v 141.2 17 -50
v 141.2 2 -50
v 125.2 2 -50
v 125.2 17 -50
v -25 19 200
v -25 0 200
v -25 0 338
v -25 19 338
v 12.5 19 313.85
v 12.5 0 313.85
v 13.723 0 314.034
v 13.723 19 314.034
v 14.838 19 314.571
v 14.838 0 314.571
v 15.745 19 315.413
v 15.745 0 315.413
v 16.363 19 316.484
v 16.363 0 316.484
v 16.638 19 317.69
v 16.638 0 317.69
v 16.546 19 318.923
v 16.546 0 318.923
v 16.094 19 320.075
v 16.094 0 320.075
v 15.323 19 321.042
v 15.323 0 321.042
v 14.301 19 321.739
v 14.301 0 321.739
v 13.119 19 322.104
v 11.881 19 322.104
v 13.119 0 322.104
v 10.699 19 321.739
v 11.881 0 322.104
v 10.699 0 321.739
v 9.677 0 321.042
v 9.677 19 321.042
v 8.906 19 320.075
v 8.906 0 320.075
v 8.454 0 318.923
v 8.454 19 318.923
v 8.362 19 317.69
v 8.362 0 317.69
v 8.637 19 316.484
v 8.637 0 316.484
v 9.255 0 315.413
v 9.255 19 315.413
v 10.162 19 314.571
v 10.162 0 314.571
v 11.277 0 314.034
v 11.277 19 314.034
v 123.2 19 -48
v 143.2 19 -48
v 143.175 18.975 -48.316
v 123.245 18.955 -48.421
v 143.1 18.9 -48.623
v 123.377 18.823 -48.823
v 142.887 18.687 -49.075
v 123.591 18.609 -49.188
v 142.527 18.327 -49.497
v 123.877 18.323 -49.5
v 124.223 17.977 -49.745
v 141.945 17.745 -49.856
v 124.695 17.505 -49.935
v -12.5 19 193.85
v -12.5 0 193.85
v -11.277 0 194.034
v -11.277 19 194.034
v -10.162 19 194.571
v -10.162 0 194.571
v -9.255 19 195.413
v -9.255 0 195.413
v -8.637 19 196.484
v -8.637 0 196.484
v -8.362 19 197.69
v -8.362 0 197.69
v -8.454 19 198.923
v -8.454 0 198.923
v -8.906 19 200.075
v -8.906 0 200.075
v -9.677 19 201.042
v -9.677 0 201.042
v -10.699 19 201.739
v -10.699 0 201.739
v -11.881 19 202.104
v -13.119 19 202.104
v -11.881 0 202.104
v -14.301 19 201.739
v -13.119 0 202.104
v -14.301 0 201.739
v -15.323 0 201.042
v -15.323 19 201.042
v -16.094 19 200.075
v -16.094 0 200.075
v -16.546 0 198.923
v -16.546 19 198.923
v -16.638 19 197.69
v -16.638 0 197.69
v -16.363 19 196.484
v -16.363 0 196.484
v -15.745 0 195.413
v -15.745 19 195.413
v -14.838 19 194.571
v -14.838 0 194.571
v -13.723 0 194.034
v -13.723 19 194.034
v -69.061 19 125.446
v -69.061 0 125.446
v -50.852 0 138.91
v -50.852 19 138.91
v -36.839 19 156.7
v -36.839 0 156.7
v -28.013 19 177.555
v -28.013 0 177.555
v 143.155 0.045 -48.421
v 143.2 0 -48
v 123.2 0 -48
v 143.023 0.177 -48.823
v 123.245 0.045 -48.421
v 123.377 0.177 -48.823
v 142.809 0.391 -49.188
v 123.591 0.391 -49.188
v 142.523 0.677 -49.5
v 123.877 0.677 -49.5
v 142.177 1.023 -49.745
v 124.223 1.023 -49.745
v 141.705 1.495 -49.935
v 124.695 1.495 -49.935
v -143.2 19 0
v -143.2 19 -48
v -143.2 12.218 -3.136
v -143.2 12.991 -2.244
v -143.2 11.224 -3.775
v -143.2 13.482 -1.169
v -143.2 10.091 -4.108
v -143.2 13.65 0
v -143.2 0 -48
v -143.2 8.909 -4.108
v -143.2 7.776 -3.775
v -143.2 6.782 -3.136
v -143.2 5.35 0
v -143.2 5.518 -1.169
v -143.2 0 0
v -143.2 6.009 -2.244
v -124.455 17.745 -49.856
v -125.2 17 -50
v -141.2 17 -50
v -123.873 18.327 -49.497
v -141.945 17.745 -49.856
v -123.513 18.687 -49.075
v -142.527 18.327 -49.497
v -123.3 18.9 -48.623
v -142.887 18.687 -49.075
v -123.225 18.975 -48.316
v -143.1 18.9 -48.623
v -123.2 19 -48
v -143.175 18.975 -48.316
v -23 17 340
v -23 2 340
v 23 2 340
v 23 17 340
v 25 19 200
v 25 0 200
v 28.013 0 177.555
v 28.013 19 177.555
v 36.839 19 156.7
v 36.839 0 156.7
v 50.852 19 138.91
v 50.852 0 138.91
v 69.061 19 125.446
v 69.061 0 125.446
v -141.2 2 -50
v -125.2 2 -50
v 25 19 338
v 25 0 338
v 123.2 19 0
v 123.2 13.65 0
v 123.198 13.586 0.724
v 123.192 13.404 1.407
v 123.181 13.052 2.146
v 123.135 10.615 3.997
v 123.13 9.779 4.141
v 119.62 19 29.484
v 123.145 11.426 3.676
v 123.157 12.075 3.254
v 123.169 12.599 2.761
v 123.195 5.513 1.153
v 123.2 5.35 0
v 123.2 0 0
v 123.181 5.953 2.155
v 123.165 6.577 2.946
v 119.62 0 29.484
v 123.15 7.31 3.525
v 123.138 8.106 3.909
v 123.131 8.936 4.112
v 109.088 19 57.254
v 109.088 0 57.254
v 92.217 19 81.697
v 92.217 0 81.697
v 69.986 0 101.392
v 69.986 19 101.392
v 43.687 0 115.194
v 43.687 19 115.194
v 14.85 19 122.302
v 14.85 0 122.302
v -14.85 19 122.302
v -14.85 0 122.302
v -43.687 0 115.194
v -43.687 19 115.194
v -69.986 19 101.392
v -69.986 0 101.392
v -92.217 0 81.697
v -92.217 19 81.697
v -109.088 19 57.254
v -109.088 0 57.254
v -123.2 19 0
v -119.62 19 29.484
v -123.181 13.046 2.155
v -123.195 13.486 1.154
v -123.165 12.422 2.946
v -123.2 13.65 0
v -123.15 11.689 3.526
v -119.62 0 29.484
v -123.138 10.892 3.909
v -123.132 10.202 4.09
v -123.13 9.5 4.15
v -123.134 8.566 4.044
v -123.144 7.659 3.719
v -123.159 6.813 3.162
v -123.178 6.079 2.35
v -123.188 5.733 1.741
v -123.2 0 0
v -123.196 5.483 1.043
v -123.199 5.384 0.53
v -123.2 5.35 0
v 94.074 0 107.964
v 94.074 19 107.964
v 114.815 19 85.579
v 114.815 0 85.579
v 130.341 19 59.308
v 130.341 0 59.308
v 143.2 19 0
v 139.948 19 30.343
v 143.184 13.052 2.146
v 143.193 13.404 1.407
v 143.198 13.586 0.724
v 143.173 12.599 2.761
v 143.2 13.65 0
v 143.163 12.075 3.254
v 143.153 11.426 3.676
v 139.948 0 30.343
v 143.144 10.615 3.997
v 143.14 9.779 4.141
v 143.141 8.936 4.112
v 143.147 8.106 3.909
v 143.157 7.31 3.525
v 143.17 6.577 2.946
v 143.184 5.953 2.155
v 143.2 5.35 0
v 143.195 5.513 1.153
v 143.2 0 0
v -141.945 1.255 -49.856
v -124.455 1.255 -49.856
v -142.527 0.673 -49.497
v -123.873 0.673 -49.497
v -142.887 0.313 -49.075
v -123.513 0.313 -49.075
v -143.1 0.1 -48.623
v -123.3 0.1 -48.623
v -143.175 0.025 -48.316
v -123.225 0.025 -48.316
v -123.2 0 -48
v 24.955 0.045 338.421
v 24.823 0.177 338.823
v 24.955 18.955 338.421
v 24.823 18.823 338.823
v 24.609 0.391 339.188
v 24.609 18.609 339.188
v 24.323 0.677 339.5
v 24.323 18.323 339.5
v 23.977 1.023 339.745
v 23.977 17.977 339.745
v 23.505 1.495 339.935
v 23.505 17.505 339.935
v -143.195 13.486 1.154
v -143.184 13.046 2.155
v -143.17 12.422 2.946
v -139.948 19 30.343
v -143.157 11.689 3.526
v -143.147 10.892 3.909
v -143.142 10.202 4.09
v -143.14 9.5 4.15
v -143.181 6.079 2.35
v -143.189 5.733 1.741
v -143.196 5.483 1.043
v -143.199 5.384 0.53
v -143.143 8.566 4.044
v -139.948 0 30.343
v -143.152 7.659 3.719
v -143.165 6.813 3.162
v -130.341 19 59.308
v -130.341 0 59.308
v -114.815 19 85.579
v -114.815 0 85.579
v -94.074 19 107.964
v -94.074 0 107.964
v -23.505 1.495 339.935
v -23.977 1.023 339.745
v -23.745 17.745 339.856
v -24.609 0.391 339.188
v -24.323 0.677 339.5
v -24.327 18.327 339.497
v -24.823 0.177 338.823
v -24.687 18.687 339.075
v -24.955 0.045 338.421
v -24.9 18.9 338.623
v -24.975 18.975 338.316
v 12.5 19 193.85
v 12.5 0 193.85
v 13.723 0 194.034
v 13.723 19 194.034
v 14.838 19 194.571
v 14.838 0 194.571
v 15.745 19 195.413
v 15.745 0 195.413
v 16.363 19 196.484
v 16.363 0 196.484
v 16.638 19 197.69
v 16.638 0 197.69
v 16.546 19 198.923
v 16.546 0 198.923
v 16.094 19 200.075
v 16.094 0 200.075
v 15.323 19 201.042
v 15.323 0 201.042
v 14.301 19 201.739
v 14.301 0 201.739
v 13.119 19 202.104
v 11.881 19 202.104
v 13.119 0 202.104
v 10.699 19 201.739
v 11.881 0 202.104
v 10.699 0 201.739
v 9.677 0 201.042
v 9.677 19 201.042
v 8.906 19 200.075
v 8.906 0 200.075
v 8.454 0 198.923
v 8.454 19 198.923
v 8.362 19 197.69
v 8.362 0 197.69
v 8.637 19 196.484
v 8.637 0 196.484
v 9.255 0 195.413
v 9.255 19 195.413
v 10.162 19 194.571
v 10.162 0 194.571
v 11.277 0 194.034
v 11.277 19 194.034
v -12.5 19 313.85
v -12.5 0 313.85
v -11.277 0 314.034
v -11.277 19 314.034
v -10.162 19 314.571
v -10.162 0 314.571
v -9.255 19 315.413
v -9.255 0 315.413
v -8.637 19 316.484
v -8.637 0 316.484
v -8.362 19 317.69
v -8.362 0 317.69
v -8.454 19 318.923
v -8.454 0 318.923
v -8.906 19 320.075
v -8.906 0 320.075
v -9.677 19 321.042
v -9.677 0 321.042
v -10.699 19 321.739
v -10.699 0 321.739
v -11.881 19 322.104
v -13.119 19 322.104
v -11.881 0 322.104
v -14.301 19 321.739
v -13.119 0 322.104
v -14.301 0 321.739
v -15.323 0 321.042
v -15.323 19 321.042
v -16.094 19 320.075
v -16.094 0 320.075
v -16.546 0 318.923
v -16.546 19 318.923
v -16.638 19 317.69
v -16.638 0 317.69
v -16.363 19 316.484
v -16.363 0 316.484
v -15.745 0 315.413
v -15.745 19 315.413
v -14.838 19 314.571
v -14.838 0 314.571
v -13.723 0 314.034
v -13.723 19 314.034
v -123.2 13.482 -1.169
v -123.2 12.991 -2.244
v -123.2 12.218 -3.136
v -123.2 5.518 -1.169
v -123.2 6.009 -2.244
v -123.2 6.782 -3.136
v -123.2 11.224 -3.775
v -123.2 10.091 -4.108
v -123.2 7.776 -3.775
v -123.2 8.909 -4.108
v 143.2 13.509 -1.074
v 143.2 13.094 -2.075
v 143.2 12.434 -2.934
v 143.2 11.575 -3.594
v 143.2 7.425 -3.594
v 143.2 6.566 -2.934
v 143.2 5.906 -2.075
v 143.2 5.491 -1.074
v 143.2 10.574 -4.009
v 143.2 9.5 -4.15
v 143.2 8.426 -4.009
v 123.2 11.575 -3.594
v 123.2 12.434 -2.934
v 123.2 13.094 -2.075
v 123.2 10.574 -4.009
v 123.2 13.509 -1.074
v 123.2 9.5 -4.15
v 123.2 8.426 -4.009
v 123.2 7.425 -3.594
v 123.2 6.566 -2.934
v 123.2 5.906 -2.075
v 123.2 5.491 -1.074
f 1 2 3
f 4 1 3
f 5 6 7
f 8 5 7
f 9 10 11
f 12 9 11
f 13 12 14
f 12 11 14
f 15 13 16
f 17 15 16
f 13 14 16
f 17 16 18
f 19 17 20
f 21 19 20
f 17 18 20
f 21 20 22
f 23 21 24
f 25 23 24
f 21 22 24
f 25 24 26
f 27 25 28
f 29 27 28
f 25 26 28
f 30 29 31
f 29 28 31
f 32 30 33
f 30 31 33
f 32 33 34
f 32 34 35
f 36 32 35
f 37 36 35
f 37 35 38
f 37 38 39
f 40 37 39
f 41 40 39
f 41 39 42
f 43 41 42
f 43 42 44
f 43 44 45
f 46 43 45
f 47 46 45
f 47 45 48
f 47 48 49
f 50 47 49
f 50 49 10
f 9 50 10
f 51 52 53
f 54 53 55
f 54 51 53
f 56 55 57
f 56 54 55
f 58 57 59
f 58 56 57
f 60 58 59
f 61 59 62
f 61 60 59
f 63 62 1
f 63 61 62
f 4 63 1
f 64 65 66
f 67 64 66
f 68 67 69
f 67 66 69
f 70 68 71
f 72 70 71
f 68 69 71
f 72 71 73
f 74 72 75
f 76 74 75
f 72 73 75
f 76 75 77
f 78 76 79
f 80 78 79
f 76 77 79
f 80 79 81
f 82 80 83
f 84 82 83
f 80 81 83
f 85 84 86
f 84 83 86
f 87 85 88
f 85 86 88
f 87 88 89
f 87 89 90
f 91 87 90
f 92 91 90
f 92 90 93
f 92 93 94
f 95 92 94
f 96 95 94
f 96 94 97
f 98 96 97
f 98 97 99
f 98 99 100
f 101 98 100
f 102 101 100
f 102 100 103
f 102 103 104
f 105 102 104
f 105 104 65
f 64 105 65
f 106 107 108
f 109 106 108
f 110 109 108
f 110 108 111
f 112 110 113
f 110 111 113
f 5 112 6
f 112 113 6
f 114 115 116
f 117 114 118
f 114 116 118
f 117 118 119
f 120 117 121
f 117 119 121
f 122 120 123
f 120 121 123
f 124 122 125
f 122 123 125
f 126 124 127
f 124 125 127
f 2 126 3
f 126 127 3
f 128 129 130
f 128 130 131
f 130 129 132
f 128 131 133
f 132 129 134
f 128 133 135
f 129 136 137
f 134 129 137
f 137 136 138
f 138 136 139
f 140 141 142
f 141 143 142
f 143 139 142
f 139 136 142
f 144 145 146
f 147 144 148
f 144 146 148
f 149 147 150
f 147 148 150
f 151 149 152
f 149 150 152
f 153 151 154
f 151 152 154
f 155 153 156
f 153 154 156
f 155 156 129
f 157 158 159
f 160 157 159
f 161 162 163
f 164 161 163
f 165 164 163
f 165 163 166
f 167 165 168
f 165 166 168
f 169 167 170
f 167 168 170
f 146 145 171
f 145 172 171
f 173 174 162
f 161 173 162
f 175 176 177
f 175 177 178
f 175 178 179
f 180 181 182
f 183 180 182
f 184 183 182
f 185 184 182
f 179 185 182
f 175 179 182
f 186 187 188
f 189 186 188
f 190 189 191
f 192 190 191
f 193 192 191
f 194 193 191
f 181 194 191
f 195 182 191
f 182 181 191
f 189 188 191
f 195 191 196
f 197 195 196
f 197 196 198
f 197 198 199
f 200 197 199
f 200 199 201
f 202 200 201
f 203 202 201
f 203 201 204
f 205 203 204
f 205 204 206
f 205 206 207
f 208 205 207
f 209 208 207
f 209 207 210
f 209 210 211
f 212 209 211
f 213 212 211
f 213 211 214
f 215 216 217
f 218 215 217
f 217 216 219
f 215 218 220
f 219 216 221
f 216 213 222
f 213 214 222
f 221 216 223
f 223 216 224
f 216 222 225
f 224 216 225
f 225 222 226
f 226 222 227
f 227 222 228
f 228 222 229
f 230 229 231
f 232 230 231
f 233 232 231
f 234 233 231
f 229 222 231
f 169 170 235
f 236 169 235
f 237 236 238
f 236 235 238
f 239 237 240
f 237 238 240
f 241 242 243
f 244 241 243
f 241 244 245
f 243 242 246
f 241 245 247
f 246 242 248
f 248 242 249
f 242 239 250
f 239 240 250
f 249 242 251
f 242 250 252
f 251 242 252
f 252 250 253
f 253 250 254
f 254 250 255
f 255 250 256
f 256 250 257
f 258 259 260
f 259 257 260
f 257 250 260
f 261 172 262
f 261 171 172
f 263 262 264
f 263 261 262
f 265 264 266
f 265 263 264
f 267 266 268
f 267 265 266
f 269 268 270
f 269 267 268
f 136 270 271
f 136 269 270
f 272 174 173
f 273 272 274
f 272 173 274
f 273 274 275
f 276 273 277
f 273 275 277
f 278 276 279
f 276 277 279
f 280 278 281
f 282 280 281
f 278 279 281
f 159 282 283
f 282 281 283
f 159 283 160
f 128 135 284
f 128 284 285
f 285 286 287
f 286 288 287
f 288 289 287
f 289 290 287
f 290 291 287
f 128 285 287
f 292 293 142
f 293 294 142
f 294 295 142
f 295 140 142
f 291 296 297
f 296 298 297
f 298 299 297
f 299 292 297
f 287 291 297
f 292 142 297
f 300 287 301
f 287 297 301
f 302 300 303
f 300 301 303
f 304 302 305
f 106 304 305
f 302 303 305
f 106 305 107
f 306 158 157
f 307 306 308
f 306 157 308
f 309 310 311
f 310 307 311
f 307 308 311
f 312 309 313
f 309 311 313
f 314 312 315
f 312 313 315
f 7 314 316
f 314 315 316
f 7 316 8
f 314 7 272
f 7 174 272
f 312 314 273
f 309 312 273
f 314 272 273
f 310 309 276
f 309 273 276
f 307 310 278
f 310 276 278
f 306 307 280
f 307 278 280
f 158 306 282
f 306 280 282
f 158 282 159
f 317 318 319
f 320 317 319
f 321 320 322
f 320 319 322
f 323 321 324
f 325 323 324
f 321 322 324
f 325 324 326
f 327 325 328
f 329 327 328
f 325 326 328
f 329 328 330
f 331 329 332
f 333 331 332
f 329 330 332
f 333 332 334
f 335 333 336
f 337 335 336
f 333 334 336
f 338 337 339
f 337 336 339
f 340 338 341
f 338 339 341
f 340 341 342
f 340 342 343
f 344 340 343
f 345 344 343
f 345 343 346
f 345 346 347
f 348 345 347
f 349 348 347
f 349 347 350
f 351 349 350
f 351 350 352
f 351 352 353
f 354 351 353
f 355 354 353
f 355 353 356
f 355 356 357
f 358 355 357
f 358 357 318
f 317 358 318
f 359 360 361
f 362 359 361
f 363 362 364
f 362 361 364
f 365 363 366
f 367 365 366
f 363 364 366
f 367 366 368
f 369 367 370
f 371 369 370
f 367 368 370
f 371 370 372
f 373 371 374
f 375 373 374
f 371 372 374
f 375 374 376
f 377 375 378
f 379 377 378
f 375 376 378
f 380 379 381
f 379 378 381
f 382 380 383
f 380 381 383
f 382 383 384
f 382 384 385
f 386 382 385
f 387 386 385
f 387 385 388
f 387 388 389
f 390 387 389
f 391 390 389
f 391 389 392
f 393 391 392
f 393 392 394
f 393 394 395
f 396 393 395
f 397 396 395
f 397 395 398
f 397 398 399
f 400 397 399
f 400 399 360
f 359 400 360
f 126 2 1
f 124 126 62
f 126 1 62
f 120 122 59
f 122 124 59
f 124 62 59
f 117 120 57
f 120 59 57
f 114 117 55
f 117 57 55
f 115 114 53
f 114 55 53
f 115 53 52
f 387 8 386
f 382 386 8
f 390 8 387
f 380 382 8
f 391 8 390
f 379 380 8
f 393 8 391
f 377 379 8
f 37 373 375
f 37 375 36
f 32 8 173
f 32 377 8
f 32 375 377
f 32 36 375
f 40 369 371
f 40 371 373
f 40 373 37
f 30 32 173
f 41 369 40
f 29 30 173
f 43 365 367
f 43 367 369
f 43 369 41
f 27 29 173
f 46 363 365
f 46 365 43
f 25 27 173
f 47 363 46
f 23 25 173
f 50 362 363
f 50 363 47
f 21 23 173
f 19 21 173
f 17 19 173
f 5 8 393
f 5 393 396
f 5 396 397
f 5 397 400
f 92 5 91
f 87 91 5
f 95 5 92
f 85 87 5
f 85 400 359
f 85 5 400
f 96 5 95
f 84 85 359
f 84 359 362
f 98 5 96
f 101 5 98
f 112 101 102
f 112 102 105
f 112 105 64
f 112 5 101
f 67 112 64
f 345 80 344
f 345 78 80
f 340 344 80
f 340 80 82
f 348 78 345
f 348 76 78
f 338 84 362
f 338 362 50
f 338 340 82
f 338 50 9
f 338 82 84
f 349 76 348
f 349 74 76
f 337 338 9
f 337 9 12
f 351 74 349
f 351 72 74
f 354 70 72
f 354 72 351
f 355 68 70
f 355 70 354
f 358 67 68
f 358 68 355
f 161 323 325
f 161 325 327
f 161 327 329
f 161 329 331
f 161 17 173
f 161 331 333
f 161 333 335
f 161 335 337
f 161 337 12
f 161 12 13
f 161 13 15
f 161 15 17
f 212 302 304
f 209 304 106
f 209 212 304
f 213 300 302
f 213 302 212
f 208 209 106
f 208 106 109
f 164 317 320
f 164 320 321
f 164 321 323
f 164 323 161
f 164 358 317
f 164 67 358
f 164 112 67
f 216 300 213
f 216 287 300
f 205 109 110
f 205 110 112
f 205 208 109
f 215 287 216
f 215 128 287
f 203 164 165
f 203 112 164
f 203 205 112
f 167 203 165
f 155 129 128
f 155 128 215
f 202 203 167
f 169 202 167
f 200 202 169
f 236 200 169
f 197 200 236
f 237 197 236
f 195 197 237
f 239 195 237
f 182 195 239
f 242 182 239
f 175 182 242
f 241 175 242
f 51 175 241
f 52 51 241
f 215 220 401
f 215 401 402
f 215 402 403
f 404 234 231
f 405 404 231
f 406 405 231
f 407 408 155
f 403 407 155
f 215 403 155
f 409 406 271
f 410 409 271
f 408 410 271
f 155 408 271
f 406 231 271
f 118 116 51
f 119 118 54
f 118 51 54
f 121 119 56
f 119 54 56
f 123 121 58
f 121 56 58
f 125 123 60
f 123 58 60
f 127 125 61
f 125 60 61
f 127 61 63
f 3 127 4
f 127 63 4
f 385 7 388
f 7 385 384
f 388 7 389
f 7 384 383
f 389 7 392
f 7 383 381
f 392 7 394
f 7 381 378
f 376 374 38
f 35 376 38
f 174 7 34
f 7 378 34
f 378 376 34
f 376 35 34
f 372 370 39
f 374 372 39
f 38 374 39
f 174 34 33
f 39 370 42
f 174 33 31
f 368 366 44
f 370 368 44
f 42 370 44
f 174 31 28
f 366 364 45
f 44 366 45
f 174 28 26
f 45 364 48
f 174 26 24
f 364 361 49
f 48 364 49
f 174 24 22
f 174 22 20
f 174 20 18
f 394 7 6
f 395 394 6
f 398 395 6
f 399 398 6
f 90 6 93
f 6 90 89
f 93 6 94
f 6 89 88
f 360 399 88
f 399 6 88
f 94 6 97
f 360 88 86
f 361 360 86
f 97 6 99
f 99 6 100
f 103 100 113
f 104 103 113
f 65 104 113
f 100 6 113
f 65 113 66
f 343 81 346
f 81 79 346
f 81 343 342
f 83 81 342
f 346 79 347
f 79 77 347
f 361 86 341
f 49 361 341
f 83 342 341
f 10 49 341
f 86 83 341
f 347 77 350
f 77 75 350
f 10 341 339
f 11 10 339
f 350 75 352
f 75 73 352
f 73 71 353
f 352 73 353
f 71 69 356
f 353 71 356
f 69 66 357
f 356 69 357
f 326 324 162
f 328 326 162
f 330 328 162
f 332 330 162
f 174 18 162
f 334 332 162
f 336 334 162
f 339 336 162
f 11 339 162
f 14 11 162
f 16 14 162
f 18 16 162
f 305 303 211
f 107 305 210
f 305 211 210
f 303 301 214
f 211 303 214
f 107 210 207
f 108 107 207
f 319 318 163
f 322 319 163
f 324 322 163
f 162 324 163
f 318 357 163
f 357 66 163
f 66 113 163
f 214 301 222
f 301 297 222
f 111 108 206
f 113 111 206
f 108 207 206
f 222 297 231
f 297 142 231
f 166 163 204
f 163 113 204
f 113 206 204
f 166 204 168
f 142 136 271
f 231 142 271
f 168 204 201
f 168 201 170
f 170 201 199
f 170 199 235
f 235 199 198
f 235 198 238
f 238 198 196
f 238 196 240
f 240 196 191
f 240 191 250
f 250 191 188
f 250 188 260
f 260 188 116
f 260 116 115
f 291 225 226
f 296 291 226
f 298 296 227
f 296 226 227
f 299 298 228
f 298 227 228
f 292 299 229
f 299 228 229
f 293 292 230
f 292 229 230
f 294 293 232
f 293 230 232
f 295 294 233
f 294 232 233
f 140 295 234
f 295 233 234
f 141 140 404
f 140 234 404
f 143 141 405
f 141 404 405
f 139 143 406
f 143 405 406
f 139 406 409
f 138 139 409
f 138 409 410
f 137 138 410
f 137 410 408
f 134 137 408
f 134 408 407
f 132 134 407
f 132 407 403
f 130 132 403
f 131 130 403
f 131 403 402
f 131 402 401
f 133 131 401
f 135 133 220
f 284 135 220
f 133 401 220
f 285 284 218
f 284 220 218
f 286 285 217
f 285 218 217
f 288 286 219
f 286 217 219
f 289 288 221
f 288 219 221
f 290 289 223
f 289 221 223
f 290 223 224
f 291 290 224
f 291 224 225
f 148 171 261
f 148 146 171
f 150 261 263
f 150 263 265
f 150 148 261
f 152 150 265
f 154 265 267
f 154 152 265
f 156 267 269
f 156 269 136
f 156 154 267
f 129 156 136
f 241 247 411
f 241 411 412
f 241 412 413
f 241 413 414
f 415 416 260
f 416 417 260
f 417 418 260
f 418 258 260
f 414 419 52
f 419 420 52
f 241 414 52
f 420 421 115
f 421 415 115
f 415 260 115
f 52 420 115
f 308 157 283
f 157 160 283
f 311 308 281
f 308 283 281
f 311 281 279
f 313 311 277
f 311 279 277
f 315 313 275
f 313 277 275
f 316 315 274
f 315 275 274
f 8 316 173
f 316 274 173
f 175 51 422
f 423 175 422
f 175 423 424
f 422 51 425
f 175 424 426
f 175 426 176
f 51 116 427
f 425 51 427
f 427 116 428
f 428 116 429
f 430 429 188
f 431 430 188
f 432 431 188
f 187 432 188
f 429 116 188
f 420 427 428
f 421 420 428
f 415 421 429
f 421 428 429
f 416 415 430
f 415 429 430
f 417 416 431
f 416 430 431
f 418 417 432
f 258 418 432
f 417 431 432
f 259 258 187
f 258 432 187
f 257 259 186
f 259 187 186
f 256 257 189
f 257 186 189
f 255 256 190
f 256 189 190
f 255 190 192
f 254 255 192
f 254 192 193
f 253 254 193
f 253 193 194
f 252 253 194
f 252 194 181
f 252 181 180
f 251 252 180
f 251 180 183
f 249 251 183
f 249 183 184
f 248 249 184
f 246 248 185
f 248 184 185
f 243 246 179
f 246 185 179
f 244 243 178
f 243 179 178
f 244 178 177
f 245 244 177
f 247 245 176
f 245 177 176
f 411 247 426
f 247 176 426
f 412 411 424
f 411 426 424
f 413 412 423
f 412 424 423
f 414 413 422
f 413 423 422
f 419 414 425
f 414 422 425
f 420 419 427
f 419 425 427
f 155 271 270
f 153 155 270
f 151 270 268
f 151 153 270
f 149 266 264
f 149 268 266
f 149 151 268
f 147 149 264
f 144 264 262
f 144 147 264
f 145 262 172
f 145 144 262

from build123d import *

# Parameters (mm, degrees)
RESSALTO_EXTRUS_O1_DEPTH                       = 19
FILETE2_R                                      = 2
FILETE3_R                                      = 2
FILETE4_R                                      = 2
FURO_ROSCADO_PARA_CONDU_TE_DE_M8X1_252_D       = 8.3
FURO_ROSCADO_PARA_CONDU_TE_DE_M8X1_251_D       = 8.3
FURO_ROSCADO_PARA_CONDU_TE_DE_M8X1_251_DEPTH   = 25
FURO_ROSCADO_PARA_CONDU_TE_DE_M8X1_251_TIP     = 2.493571569
FURO_ROSCADO_PARA_CONDU_TE_DE_M8X1_251_O_D     = 8.3
FURO_ROSCADO_PARA_CONDU_TE_DE_M8X1_251_O_DEPTH = 25
FURO_ROSCADO_PARA_CONDU_TE_DE_M8X1_251_O_TIP   = 2.493571569


with BuildPart() as part:
    # Esboço2 → Ressalto-extrusão1 (new body)
    with BuildSketch(Plane(origin=(0, 0, 0), x_dir=(1, 0, 0), z_dir=(0, 1, 0))):
        with BuildLine():
            Line((-25, -200), (-25, -340))
            Line((-25, -340), (25, -340))
            Line((25, -340), (25, -200))
            ThreePointArc((25, -200), (36.838728685, -156.699788653), (69.061196889, -125.446367362))
            ThreePointArc((69.061196889, -125.446367362), (123.279770024, -72.858344084), (143.2, 0))
            Line((143.2, 0), (143.2, 50))
            Line((143.2, 50), (123.2, 50))
            Line((123.2, 50), (123.2, 0))
            ThreePointArc((123.2, 0), (0, -123.2), (-123.2, 0))
            Line((-123.2, 0), (-123.2, 50))
            Line((-123.2, 50), (-143.2, 50))
            Line((-143.2, 50), (-143.2, 0))
            ThreePointArc((-143.2, 0), (-123.279770024, -72.858344084), (-69.061196889, -125.446367362))
            ThreePointArc((-69.061196889, -125.446367362), (-36.838728685, -156.699788653), (-25, -200))
        make_face()
    extrude(amount=RESSALTO_EXTRUS_O1_DEPTH)

    # Filete2
    filete2_edges = [part.edges().sort_by_distance(p)[0] for p in [
        (-133.2, 19, -50),
        (-133.2, 0, -50),
        (-143.2, 9.5, -50),
        (-123.2, 9.5, -50),
    ]]
    fillet(filete2_edges, radius=FILETE2_R)

    # Filete3
    filete3_edges = [part.edges().sort_by_distance(p)[0] for p in [
        (133.2, 0, -50),
        (123.2, 9.5, -50),
        (143.2, 9.5, -50),
        (133.2, 19, -50),
    ]]
    fillet(filete3_edges, radius=FILETE3_R)

    # Filete4
    filete4_edges = [part.edges().sort_by_distance(p)[0] for p in [
        (0, 0, 340),
        (25, 9.5, 340),
        (-25, 9.5, 340),
        (0, 19, 340),
    ]]
    fillet(filete4_edges, radius=FILETE4_R)

    # Furo roscado para conduíte de M8x1.252 (through all)
    with Locations(Plane(origin=(-12.5, 19, 318), x_dir=(0, 0, 1), z_dir=(0, 1, 0))):
        with Locations((0, 0), (0, 25), (-120, 25), (-120, 0)):
            Hole(FURO_ROSCADO_PARA_CONDU_TE_DE_M8X1_252_D / 2)

    # Furo roscado para conduíte de M8x1.251
    with Locations(Plane(origin=(143.2, 9.5, 0), x_dir=(0, 0, 1), z_dir=(1, 0, 0))):
        with Locations((0, 0)):
            Hole(FURO_ROSCADO_PARA_CONDU_TE_DE_M8X1_251_D / 2, depth=FURO_ROSCADO_PARA_CONDU_TE_DE_M8X1_251_DEPTH)
            with Locations((0, 0, -(FURO_ROSCADO_PARA_CONDU_TE_DE_M8X1_251_DEPTH + FURO_ROSCADO_PARA_CONDU_TE_DE_M8X1_251_TIP / 2))):  # 118° drill point
                Cone(0, FURO_ROSCADO_PARA_CONDU_TE_DE_M8X1_251_D / 2, FURO_ROSCADO_PARA_CONDU_TE_DE_M8X1_251_TIP, mode=Mode.SUBTRACT)

    # Furo roscado para conduíte de M8x1.251 o
    with Locations(Plane(origin=(-143.2, 9.5, 0), x_dir=(0, 0, -1), z_dir=(-1, 0, 0))):
        with Locations((0, 0)):
            Hole(FURO_ROSCADO_PARA_CONDU_TE_DE_M8X1_251_O_D / 2, depth=FURO_ROSCADO_PARA_CONDU_TE_DE_M8X1_251_O_DEPTH)
            with Locations((0, 0, -(FURO_ROSCADO_PARA_CONDU_TE_DE_M8X1_251_O_DEPTH + FURO_ROSCADO_PARA_CONDU_TE_DE_M8X1_251_O_TIP / 2))):  # 118° drill point
                Cone(0, FURO_ROSCADO_PARA_CONDU_TE_DE_M8X1_251_O_D / 2, FURO_ROSCADO_PARA_CONDU_TE_DE_M8X1_251_O_TIP, mode=Mode.SUBTRACT)


solid = part.part
